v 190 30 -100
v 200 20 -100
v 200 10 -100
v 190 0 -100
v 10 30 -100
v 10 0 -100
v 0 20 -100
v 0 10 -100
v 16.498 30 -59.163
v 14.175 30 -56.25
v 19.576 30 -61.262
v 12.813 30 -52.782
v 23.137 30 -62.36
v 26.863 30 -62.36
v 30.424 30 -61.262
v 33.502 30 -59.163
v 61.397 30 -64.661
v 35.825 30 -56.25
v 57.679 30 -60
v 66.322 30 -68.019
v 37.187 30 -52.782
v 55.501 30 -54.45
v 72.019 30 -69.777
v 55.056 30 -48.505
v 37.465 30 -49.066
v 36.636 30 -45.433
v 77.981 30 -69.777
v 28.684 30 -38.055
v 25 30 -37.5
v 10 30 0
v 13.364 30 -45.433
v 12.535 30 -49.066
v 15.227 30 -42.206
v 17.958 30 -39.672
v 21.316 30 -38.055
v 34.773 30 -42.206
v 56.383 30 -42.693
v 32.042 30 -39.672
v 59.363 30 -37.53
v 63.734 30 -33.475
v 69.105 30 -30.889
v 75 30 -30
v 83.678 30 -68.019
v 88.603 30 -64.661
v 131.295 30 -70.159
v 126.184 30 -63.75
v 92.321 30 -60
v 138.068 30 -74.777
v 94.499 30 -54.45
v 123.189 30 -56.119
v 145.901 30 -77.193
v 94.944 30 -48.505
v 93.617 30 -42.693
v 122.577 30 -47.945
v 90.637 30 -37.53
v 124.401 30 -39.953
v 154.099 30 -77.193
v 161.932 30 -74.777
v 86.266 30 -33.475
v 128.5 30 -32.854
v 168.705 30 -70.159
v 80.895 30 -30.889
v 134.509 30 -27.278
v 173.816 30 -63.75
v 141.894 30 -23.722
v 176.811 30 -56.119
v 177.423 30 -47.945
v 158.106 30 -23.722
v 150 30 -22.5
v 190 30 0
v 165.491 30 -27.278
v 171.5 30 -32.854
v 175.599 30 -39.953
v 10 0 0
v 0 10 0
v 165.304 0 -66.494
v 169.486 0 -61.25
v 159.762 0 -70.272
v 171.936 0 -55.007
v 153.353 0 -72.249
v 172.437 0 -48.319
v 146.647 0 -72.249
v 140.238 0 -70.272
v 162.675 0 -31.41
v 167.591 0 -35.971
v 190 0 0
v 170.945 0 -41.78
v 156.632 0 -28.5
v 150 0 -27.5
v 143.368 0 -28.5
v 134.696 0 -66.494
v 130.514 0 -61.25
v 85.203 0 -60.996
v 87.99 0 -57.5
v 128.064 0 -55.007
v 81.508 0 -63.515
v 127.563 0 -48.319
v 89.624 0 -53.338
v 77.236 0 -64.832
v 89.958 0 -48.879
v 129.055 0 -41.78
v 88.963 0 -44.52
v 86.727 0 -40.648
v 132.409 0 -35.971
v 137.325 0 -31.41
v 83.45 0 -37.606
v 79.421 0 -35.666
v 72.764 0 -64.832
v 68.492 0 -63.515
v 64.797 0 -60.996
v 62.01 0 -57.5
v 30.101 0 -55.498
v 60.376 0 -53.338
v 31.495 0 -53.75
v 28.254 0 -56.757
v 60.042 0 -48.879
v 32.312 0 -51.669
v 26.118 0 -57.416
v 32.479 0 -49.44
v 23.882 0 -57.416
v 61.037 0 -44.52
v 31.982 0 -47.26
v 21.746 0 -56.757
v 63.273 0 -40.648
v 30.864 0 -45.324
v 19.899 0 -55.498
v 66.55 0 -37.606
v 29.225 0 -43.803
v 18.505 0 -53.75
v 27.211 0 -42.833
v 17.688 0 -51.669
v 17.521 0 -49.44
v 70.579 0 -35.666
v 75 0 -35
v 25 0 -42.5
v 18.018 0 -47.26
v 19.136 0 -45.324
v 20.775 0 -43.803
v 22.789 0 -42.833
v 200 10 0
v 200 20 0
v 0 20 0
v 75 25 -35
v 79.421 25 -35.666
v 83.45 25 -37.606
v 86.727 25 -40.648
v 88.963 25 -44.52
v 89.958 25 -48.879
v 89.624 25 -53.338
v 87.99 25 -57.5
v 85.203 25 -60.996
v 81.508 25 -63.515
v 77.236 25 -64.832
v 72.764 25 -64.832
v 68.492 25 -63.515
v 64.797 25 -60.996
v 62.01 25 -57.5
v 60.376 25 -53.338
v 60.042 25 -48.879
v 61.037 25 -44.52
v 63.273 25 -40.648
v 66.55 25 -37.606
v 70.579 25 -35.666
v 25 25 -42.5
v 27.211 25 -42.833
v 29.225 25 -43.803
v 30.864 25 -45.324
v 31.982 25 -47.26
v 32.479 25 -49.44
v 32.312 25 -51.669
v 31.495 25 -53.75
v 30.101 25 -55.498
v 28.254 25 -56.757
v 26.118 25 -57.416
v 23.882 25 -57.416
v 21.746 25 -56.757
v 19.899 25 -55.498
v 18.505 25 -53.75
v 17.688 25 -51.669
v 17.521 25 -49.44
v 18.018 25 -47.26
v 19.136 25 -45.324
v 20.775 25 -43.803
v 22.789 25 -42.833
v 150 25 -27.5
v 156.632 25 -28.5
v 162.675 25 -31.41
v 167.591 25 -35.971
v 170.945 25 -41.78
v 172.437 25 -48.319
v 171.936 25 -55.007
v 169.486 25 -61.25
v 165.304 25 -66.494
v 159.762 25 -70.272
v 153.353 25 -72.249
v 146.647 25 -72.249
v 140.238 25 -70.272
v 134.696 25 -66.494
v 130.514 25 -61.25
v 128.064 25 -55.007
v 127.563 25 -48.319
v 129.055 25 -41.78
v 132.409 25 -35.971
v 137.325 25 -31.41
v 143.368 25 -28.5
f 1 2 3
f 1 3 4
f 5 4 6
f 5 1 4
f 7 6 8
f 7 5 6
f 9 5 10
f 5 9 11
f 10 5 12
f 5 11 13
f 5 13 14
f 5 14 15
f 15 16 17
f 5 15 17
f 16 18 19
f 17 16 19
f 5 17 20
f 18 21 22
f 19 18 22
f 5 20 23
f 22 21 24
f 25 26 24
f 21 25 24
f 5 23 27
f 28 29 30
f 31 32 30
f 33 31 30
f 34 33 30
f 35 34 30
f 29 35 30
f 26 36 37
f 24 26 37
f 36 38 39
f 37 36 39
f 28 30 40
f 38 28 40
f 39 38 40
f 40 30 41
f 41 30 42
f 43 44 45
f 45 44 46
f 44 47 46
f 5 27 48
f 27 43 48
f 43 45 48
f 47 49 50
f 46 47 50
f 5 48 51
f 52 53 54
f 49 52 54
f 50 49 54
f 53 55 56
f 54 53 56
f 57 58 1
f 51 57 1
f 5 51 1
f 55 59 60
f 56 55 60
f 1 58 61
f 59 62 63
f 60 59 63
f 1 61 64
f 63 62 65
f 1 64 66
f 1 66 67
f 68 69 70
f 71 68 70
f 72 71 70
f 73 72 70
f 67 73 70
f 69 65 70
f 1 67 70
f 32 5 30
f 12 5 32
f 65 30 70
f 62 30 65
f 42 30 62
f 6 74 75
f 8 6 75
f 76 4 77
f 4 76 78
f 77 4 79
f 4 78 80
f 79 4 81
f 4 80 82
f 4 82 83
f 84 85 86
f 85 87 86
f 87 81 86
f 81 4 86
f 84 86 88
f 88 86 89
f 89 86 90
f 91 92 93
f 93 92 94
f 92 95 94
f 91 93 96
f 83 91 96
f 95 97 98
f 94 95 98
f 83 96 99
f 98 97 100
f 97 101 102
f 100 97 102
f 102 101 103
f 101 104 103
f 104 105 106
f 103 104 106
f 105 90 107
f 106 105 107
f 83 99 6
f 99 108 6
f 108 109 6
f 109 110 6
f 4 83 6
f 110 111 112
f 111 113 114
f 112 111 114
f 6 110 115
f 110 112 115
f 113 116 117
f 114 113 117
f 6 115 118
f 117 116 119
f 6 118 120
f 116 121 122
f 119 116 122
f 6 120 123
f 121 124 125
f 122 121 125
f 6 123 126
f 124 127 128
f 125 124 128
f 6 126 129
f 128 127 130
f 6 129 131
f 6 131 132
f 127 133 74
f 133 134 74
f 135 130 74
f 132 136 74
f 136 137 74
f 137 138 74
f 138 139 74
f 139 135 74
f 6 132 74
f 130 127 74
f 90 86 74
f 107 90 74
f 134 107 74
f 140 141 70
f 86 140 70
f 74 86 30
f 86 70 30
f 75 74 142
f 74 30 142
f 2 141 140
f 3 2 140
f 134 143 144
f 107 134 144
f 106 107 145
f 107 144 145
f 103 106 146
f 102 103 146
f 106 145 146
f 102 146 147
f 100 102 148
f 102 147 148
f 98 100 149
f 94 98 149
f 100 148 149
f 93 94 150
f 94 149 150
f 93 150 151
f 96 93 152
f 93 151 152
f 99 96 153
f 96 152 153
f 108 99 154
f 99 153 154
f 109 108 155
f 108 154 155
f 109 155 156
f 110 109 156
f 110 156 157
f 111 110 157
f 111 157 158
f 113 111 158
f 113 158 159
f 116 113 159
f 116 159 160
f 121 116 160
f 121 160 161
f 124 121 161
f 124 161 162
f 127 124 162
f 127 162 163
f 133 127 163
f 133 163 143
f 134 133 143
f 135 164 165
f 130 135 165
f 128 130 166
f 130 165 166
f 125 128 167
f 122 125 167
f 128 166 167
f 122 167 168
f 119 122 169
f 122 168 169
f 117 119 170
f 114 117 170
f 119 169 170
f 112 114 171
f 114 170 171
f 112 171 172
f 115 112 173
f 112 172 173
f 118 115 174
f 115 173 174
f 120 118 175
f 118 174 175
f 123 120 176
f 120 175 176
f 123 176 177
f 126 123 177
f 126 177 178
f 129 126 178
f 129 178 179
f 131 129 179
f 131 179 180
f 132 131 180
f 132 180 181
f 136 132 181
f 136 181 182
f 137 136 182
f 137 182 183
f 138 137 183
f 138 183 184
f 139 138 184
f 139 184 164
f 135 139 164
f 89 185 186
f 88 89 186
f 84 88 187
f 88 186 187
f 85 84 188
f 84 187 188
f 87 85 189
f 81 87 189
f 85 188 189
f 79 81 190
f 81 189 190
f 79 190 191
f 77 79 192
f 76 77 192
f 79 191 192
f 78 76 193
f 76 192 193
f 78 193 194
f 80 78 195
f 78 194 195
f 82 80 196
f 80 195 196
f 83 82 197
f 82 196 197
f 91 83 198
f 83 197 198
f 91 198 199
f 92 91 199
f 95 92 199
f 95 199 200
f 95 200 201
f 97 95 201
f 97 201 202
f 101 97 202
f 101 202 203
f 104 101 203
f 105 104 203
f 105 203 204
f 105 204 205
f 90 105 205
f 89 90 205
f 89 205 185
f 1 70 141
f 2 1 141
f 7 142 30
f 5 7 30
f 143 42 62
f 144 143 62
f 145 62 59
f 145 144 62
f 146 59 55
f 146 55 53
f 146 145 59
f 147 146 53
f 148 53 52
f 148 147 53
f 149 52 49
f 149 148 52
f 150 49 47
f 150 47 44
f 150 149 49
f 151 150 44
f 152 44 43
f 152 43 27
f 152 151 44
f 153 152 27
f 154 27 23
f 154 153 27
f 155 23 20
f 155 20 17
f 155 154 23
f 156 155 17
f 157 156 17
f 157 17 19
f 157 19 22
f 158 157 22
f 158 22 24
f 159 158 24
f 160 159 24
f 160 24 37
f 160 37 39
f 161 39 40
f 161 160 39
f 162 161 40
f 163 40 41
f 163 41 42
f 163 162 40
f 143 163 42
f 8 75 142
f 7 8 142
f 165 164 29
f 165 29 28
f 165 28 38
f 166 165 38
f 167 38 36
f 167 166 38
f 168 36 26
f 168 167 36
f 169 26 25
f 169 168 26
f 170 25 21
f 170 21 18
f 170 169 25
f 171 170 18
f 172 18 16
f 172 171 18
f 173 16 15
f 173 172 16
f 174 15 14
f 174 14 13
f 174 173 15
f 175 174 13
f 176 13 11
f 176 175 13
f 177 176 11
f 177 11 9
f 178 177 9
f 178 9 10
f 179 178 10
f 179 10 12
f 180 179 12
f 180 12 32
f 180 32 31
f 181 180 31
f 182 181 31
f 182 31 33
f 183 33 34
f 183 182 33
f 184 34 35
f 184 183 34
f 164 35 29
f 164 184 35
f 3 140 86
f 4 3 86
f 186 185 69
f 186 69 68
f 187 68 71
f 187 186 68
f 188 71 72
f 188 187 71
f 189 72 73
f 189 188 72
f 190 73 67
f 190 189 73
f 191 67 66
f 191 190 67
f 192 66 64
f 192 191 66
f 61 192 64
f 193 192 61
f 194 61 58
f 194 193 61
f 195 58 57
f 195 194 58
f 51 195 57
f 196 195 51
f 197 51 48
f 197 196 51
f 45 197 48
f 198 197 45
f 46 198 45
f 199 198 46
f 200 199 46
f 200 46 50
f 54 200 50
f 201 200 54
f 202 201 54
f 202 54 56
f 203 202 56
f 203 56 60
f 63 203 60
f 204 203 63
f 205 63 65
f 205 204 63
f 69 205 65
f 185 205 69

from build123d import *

# Parameters (mm, degrees)
SALIENTE_EXTRUIR1_DEPTH = 100
CROQUIS3_R              = 7.5
CROQUIS3_R_2            = 15
CROQUIS3_R_3            = 22.5
CORTAR_EXTRUIR1_DEPTH   = 226.610283454
CHAFL_N1_SIZE           = 5


with BuildPart() as part:
    # Croquis2 → Saliente-Extruir1 (new body)
    with BuildSketch(Plane.XY):
        Polygon((10, 30), (190, 30), (200, 20), (200, 10), (190, 0), (10, 0), (0, 10), (0, 20), align=None)
    extrude(amount=-SALIENTE_EXTRUIR1_DEPTH)

    # Croquis3 → Cortar-Extruir1 (cut, through all)
    with BuildSketch(Plane(origin=(0, 30, 0), x_dir=(1, 0, 0), z_dir=(0, 1, 0))):
        with Locations(Location((25, 50, 0), (0, 0, 270))):
            Circle(CROQUIS3_R)
        with Locations(Location((75, 50, 0), (0, 0, 270))):
            Circle(CROQUIS3_R_2)
        with Locations(Location((150, 50, 0), (0, 0, 270))):
            Circle(CROQUIS3_R_3)
    extrude(amount=-CORTAR_EXTRUIR1_DEPTH, mode=Mode.SUBTRACT)

    # Chaflán1
    chafl_n1_edges = [part.edges().sort_by_distance(p)[0] for p in [
        (25, 30, -57.5),
        (75, 30, -65),
        (150, 30, -72.5),
    ]]
    chamfer(chafl_n1_edges, length=CHAFL_N1_SIZE)


solid = part.part
